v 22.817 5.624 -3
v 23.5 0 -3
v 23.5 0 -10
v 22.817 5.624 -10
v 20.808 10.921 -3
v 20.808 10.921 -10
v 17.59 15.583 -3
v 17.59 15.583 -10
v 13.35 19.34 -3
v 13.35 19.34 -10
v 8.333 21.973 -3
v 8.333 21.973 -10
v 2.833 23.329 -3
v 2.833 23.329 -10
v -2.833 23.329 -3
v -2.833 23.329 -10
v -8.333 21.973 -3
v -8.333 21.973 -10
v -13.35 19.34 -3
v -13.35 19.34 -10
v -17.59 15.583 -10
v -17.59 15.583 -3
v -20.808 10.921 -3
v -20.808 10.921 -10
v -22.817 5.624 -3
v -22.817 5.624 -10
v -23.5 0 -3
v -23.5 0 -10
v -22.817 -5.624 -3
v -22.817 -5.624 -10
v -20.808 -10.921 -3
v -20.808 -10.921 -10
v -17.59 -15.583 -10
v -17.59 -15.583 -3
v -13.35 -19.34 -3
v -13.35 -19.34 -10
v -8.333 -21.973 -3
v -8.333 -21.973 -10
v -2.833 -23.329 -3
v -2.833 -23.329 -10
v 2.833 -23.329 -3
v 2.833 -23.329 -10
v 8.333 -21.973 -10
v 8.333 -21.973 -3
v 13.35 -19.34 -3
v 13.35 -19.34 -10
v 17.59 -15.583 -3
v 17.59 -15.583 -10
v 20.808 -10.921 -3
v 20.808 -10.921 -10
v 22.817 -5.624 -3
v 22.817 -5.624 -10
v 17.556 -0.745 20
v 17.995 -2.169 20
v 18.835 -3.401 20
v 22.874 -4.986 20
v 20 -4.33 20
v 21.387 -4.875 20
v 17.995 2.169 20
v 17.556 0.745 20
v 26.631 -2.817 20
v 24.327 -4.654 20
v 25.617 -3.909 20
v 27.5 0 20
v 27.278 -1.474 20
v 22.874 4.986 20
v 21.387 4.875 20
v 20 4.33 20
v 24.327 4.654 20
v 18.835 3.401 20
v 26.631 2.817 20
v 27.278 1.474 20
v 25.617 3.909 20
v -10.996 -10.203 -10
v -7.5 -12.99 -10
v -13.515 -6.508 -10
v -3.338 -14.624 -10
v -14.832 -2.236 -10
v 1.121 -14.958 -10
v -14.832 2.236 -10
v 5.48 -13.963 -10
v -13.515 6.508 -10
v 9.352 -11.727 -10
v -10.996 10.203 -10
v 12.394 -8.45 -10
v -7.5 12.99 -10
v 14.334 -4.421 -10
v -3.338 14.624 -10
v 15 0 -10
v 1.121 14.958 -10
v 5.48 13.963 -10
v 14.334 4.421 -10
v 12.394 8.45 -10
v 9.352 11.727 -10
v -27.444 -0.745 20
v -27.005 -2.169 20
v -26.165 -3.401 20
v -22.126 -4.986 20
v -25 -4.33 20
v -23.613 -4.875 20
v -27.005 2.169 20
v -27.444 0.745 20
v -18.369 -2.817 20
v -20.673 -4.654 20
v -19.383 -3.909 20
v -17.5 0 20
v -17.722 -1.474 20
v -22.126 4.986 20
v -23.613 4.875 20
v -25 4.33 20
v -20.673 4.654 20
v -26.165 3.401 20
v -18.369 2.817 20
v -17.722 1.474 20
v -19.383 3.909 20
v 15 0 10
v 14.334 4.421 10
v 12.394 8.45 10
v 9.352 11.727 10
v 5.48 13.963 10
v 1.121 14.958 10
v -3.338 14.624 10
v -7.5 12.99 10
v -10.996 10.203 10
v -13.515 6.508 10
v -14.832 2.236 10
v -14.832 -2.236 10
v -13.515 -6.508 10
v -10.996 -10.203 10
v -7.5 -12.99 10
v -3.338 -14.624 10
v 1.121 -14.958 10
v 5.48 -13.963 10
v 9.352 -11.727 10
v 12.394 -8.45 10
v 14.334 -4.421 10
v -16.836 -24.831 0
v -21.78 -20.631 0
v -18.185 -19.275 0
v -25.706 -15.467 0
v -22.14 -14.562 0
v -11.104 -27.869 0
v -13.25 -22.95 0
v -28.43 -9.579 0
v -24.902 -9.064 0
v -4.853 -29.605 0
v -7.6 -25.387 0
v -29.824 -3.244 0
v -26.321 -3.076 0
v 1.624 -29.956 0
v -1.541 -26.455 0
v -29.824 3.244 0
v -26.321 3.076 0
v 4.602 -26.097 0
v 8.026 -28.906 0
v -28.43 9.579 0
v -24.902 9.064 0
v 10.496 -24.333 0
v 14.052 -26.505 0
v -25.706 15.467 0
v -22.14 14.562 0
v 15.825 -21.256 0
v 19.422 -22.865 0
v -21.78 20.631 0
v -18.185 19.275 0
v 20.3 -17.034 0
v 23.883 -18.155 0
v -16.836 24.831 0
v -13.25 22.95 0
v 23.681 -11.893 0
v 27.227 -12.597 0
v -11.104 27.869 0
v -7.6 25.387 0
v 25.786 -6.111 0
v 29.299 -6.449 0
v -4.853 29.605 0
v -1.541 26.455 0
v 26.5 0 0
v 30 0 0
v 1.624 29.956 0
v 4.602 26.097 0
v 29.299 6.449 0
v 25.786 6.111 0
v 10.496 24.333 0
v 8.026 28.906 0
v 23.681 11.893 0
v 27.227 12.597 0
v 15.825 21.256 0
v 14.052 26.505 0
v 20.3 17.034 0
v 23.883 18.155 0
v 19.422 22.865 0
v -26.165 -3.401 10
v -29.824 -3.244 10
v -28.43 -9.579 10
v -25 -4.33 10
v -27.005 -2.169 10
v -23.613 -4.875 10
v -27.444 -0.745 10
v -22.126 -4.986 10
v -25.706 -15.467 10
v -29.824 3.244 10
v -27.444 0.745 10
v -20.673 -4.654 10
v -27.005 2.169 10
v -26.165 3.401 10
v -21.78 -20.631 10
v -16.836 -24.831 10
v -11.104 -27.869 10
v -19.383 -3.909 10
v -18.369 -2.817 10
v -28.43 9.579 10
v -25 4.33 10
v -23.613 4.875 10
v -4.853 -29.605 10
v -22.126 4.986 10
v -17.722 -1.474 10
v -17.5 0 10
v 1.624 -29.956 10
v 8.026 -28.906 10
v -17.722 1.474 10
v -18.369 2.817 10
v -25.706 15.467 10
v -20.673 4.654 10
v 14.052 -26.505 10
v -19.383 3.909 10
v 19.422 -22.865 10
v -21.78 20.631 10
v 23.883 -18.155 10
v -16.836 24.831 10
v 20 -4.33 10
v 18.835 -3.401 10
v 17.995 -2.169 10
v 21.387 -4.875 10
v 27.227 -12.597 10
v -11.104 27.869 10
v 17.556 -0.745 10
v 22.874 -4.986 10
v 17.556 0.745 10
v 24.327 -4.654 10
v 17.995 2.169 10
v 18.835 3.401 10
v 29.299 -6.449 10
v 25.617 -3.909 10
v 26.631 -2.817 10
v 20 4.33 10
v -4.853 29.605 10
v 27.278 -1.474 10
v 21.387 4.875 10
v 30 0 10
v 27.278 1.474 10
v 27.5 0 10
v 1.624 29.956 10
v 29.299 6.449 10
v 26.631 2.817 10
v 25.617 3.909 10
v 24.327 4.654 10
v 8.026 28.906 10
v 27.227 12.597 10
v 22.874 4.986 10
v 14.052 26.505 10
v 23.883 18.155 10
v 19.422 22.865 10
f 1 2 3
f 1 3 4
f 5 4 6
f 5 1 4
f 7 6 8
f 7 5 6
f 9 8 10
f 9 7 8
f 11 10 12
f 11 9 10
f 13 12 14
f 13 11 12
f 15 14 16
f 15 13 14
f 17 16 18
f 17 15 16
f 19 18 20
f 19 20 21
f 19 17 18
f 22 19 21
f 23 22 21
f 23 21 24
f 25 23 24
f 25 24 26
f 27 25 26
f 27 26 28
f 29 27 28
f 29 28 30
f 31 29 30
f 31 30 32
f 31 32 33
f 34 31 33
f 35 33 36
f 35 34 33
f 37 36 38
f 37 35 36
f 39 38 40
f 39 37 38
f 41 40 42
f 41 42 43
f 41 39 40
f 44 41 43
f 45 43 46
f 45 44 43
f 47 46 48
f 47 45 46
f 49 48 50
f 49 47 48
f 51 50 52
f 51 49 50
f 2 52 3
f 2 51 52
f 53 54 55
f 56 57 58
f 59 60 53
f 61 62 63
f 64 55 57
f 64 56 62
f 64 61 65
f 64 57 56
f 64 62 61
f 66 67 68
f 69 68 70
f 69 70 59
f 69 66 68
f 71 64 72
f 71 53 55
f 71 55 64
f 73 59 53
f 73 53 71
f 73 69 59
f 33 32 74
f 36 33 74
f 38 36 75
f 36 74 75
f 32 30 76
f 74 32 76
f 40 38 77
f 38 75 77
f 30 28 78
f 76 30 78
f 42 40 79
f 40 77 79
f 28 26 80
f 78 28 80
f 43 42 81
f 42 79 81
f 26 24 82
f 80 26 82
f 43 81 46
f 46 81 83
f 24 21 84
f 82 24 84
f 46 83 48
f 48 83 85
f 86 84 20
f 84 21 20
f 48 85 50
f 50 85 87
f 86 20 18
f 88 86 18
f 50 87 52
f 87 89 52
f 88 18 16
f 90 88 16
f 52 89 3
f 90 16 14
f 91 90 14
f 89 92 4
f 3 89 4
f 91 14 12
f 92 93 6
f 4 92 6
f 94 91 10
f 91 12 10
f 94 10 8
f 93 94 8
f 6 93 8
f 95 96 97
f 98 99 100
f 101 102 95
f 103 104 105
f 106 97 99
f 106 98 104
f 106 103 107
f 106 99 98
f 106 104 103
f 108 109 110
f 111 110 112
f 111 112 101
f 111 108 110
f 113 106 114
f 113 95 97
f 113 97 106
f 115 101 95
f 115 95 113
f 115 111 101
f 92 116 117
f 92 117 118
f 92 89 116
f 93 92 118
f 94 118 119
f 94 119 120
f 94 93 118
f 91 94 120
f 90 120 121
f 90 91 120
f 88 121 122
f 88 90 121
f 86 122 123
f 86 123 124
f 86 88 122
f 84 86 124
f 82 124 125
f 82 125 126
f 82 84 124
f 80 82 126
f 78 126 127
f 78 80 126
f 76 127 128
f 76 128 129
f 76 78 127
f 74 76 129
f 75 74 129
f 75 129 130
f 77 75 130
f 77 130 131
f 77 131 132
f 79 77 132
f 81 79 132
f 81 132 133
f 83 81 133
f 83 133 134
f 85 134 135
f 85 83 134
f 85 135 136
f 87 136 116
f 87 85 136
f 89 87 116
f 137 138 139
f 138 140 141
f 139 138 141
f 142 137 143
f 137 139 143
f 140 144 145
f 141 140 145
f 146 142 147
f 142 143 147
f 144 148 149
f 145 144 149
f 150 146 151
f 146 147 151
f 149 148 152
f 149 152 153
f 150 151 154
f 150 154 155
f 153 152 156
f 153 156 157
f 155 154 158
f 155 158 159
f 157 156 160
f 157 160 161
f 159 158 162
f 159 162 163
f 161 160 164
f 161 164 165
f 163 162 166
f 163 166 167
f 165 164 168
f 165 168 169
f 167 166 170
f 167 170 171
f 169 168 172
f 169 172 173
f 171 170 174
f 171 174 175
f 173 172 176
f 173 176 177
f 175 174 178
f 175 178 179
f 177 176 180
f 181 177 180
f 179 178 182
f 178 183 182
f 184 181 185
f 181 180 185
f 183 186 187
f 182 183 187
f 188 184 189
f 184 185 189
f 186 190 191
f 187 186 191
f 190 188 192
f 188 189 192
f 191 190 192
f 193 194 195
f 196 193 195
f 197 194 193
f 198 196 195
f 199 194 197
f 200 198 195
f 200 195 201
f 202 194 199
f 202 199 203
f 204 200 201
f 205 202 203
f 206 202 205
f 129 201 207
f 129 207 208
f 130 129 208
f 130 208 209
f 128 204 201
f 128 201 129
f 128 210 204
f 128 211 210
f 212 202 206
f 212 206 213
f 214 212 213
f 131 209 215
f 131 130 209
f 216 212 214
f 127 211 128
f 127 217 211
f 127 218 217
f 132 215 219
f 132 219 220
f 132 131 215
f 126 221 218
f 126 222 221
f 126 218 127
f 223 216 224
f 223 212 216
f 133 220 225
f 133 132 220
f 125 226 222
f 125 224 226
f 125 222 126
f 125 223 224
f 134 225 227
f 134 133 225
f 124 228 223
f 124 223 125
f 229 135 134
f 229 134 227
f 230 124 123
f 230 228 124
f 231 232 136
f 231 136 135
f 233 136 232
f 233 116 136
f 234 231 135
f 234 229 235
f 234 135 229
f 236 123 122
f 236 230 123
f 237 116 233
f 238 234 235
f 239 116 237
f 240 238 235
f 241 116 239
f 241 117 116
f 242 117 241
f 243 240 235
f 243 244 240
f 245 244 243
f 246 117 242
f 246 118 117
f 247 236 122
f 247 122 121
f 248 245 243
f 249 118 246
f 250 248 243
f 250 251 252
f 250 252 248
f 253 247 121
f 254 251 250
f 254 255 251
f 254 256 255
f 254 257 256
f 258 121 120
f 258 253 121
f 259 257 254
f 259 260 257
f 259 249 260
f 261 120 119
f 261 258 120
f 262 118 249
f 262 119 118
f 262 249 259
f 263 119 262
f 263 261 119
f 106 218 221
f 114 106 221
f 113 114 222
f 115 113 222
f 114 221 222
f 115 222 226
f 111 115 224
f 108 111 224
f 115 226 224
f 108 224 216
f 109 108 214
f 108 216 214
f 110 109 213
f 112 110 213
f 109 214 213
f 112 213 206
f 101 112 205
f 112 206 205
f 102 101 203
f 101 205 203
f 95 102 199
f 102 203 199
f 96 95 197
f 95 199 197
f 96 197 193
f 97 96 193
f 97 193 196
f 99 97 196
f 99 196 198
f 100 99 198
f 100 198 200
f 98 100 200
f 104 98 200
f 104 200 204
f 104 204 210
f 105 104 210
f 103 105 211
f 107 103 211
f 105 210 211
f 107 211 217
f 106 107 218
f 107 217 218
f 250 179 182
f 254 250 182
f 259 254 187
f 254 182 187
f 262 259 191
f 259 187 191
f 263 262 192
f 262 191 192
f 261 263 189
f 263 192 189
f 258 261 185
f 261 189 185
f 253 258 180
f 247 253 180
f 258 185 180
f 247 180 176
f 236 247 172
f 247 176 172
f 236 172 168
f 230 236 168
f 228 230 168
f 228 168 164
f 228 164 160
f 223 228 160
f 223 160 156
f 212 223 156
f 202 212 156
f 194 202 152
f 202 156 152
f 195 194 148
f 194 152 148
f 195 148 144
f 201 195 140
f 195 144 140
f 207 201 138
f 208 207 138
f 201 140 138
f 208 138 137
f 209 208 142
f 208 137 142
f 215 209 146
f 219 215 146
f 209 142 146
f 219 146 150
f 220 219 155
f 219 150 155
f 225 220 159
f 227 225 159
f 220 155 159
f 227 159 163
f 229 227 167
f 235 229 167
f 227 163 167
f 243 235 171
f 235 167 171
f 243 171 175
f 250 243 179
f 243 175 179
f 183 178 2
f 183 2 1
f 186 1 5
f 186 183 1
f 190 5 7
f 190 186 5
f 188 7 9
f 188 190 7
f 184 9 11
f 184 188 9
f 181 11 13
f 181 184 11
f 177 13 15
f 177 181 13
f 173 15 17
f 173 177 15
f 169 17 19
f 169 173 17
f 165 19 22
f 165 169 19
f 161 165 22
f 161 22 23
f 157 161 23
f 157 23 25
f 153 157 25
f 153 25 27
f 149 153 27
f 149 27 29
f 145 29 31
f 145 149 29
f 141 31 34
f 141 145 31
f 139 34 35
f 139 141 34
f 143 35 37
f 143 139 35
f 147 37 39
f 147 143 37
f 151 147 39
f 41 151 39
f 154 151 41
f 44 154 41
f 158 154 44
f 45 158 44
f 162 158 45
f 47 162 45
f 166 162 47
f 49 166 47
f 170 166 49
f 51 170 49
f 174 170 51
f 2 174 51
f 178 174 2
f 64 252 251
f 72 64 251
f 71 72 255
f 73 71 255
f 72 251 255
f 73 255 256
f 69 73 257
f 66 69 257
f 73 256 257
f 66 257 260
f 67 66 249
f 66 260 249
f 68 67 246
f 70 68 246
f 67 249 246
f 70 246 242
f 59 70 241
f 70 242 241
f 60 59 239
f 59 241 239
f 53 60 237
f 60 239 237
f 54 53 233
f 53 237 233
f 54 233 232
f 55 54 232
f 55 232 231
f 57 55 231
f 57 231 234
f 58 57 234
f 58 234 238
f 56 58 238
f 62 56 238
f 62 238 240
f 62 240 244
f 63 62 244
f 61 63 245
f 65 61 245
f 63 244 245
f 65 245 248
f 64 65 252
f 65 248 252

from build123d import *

# Parameters (mm, degrees)
SKETCH1_R           = 23.5
SKETCH1_R_2         = 15
BOSS_EXTRUDE1_DEPTH = 10
SKETCH2_R           = 30
SKETCH2_R_2         = 15
BOSS_EXTRUDE2_DEPTH = 10
CHAMFER1_SIZE       = 3
SKETCH3_R           = 5
BOSS_EXTRUDE3_DEPTH = 10


with BuildPart() as part:
    # Sketch1 → Boss-Extrude1 (new body)
    with BuildSketch(Plane.XY):
        Circle(SKETCH1_R)
        Circle(SKETCH1_R_2, mode=Mode.SUBTRACT)
    extrude(amount=-BOSS_EXTRUDE1_DEPTH)

    # Sketch2 → Boss-Extrude2 (add)
    with BuildSketch(Plane.XY):
        Circle(SKETCH2_R)
        Circle(SKETCH2_R_2, mode=Mode.SUBTRACT)
    extrude(amount=BOSS_EXTRUDE2_DEPTH)

    # Chamfer1
    chamfer1_edges = [part.edges().sort_by_distance(p)[0] for p in [
        (-23.5, 0, 0),
    ]]
    chamfer(chamfer1_edges, length=CHAMFER1_SIZE)

    # Sketch3 → Boss-Extrude3 (add)
    with BuildSketch(Plane.XY.offset(10)):
        with Locations((-22.5, 0)):
            Circle(SKETCH3_R)
        with Locations((22.5, 0)):
            Circle(SKETCH3_R)
    extrude(amount=BOSS_EXTRUDE3_DEPTH)


solid = part.part
